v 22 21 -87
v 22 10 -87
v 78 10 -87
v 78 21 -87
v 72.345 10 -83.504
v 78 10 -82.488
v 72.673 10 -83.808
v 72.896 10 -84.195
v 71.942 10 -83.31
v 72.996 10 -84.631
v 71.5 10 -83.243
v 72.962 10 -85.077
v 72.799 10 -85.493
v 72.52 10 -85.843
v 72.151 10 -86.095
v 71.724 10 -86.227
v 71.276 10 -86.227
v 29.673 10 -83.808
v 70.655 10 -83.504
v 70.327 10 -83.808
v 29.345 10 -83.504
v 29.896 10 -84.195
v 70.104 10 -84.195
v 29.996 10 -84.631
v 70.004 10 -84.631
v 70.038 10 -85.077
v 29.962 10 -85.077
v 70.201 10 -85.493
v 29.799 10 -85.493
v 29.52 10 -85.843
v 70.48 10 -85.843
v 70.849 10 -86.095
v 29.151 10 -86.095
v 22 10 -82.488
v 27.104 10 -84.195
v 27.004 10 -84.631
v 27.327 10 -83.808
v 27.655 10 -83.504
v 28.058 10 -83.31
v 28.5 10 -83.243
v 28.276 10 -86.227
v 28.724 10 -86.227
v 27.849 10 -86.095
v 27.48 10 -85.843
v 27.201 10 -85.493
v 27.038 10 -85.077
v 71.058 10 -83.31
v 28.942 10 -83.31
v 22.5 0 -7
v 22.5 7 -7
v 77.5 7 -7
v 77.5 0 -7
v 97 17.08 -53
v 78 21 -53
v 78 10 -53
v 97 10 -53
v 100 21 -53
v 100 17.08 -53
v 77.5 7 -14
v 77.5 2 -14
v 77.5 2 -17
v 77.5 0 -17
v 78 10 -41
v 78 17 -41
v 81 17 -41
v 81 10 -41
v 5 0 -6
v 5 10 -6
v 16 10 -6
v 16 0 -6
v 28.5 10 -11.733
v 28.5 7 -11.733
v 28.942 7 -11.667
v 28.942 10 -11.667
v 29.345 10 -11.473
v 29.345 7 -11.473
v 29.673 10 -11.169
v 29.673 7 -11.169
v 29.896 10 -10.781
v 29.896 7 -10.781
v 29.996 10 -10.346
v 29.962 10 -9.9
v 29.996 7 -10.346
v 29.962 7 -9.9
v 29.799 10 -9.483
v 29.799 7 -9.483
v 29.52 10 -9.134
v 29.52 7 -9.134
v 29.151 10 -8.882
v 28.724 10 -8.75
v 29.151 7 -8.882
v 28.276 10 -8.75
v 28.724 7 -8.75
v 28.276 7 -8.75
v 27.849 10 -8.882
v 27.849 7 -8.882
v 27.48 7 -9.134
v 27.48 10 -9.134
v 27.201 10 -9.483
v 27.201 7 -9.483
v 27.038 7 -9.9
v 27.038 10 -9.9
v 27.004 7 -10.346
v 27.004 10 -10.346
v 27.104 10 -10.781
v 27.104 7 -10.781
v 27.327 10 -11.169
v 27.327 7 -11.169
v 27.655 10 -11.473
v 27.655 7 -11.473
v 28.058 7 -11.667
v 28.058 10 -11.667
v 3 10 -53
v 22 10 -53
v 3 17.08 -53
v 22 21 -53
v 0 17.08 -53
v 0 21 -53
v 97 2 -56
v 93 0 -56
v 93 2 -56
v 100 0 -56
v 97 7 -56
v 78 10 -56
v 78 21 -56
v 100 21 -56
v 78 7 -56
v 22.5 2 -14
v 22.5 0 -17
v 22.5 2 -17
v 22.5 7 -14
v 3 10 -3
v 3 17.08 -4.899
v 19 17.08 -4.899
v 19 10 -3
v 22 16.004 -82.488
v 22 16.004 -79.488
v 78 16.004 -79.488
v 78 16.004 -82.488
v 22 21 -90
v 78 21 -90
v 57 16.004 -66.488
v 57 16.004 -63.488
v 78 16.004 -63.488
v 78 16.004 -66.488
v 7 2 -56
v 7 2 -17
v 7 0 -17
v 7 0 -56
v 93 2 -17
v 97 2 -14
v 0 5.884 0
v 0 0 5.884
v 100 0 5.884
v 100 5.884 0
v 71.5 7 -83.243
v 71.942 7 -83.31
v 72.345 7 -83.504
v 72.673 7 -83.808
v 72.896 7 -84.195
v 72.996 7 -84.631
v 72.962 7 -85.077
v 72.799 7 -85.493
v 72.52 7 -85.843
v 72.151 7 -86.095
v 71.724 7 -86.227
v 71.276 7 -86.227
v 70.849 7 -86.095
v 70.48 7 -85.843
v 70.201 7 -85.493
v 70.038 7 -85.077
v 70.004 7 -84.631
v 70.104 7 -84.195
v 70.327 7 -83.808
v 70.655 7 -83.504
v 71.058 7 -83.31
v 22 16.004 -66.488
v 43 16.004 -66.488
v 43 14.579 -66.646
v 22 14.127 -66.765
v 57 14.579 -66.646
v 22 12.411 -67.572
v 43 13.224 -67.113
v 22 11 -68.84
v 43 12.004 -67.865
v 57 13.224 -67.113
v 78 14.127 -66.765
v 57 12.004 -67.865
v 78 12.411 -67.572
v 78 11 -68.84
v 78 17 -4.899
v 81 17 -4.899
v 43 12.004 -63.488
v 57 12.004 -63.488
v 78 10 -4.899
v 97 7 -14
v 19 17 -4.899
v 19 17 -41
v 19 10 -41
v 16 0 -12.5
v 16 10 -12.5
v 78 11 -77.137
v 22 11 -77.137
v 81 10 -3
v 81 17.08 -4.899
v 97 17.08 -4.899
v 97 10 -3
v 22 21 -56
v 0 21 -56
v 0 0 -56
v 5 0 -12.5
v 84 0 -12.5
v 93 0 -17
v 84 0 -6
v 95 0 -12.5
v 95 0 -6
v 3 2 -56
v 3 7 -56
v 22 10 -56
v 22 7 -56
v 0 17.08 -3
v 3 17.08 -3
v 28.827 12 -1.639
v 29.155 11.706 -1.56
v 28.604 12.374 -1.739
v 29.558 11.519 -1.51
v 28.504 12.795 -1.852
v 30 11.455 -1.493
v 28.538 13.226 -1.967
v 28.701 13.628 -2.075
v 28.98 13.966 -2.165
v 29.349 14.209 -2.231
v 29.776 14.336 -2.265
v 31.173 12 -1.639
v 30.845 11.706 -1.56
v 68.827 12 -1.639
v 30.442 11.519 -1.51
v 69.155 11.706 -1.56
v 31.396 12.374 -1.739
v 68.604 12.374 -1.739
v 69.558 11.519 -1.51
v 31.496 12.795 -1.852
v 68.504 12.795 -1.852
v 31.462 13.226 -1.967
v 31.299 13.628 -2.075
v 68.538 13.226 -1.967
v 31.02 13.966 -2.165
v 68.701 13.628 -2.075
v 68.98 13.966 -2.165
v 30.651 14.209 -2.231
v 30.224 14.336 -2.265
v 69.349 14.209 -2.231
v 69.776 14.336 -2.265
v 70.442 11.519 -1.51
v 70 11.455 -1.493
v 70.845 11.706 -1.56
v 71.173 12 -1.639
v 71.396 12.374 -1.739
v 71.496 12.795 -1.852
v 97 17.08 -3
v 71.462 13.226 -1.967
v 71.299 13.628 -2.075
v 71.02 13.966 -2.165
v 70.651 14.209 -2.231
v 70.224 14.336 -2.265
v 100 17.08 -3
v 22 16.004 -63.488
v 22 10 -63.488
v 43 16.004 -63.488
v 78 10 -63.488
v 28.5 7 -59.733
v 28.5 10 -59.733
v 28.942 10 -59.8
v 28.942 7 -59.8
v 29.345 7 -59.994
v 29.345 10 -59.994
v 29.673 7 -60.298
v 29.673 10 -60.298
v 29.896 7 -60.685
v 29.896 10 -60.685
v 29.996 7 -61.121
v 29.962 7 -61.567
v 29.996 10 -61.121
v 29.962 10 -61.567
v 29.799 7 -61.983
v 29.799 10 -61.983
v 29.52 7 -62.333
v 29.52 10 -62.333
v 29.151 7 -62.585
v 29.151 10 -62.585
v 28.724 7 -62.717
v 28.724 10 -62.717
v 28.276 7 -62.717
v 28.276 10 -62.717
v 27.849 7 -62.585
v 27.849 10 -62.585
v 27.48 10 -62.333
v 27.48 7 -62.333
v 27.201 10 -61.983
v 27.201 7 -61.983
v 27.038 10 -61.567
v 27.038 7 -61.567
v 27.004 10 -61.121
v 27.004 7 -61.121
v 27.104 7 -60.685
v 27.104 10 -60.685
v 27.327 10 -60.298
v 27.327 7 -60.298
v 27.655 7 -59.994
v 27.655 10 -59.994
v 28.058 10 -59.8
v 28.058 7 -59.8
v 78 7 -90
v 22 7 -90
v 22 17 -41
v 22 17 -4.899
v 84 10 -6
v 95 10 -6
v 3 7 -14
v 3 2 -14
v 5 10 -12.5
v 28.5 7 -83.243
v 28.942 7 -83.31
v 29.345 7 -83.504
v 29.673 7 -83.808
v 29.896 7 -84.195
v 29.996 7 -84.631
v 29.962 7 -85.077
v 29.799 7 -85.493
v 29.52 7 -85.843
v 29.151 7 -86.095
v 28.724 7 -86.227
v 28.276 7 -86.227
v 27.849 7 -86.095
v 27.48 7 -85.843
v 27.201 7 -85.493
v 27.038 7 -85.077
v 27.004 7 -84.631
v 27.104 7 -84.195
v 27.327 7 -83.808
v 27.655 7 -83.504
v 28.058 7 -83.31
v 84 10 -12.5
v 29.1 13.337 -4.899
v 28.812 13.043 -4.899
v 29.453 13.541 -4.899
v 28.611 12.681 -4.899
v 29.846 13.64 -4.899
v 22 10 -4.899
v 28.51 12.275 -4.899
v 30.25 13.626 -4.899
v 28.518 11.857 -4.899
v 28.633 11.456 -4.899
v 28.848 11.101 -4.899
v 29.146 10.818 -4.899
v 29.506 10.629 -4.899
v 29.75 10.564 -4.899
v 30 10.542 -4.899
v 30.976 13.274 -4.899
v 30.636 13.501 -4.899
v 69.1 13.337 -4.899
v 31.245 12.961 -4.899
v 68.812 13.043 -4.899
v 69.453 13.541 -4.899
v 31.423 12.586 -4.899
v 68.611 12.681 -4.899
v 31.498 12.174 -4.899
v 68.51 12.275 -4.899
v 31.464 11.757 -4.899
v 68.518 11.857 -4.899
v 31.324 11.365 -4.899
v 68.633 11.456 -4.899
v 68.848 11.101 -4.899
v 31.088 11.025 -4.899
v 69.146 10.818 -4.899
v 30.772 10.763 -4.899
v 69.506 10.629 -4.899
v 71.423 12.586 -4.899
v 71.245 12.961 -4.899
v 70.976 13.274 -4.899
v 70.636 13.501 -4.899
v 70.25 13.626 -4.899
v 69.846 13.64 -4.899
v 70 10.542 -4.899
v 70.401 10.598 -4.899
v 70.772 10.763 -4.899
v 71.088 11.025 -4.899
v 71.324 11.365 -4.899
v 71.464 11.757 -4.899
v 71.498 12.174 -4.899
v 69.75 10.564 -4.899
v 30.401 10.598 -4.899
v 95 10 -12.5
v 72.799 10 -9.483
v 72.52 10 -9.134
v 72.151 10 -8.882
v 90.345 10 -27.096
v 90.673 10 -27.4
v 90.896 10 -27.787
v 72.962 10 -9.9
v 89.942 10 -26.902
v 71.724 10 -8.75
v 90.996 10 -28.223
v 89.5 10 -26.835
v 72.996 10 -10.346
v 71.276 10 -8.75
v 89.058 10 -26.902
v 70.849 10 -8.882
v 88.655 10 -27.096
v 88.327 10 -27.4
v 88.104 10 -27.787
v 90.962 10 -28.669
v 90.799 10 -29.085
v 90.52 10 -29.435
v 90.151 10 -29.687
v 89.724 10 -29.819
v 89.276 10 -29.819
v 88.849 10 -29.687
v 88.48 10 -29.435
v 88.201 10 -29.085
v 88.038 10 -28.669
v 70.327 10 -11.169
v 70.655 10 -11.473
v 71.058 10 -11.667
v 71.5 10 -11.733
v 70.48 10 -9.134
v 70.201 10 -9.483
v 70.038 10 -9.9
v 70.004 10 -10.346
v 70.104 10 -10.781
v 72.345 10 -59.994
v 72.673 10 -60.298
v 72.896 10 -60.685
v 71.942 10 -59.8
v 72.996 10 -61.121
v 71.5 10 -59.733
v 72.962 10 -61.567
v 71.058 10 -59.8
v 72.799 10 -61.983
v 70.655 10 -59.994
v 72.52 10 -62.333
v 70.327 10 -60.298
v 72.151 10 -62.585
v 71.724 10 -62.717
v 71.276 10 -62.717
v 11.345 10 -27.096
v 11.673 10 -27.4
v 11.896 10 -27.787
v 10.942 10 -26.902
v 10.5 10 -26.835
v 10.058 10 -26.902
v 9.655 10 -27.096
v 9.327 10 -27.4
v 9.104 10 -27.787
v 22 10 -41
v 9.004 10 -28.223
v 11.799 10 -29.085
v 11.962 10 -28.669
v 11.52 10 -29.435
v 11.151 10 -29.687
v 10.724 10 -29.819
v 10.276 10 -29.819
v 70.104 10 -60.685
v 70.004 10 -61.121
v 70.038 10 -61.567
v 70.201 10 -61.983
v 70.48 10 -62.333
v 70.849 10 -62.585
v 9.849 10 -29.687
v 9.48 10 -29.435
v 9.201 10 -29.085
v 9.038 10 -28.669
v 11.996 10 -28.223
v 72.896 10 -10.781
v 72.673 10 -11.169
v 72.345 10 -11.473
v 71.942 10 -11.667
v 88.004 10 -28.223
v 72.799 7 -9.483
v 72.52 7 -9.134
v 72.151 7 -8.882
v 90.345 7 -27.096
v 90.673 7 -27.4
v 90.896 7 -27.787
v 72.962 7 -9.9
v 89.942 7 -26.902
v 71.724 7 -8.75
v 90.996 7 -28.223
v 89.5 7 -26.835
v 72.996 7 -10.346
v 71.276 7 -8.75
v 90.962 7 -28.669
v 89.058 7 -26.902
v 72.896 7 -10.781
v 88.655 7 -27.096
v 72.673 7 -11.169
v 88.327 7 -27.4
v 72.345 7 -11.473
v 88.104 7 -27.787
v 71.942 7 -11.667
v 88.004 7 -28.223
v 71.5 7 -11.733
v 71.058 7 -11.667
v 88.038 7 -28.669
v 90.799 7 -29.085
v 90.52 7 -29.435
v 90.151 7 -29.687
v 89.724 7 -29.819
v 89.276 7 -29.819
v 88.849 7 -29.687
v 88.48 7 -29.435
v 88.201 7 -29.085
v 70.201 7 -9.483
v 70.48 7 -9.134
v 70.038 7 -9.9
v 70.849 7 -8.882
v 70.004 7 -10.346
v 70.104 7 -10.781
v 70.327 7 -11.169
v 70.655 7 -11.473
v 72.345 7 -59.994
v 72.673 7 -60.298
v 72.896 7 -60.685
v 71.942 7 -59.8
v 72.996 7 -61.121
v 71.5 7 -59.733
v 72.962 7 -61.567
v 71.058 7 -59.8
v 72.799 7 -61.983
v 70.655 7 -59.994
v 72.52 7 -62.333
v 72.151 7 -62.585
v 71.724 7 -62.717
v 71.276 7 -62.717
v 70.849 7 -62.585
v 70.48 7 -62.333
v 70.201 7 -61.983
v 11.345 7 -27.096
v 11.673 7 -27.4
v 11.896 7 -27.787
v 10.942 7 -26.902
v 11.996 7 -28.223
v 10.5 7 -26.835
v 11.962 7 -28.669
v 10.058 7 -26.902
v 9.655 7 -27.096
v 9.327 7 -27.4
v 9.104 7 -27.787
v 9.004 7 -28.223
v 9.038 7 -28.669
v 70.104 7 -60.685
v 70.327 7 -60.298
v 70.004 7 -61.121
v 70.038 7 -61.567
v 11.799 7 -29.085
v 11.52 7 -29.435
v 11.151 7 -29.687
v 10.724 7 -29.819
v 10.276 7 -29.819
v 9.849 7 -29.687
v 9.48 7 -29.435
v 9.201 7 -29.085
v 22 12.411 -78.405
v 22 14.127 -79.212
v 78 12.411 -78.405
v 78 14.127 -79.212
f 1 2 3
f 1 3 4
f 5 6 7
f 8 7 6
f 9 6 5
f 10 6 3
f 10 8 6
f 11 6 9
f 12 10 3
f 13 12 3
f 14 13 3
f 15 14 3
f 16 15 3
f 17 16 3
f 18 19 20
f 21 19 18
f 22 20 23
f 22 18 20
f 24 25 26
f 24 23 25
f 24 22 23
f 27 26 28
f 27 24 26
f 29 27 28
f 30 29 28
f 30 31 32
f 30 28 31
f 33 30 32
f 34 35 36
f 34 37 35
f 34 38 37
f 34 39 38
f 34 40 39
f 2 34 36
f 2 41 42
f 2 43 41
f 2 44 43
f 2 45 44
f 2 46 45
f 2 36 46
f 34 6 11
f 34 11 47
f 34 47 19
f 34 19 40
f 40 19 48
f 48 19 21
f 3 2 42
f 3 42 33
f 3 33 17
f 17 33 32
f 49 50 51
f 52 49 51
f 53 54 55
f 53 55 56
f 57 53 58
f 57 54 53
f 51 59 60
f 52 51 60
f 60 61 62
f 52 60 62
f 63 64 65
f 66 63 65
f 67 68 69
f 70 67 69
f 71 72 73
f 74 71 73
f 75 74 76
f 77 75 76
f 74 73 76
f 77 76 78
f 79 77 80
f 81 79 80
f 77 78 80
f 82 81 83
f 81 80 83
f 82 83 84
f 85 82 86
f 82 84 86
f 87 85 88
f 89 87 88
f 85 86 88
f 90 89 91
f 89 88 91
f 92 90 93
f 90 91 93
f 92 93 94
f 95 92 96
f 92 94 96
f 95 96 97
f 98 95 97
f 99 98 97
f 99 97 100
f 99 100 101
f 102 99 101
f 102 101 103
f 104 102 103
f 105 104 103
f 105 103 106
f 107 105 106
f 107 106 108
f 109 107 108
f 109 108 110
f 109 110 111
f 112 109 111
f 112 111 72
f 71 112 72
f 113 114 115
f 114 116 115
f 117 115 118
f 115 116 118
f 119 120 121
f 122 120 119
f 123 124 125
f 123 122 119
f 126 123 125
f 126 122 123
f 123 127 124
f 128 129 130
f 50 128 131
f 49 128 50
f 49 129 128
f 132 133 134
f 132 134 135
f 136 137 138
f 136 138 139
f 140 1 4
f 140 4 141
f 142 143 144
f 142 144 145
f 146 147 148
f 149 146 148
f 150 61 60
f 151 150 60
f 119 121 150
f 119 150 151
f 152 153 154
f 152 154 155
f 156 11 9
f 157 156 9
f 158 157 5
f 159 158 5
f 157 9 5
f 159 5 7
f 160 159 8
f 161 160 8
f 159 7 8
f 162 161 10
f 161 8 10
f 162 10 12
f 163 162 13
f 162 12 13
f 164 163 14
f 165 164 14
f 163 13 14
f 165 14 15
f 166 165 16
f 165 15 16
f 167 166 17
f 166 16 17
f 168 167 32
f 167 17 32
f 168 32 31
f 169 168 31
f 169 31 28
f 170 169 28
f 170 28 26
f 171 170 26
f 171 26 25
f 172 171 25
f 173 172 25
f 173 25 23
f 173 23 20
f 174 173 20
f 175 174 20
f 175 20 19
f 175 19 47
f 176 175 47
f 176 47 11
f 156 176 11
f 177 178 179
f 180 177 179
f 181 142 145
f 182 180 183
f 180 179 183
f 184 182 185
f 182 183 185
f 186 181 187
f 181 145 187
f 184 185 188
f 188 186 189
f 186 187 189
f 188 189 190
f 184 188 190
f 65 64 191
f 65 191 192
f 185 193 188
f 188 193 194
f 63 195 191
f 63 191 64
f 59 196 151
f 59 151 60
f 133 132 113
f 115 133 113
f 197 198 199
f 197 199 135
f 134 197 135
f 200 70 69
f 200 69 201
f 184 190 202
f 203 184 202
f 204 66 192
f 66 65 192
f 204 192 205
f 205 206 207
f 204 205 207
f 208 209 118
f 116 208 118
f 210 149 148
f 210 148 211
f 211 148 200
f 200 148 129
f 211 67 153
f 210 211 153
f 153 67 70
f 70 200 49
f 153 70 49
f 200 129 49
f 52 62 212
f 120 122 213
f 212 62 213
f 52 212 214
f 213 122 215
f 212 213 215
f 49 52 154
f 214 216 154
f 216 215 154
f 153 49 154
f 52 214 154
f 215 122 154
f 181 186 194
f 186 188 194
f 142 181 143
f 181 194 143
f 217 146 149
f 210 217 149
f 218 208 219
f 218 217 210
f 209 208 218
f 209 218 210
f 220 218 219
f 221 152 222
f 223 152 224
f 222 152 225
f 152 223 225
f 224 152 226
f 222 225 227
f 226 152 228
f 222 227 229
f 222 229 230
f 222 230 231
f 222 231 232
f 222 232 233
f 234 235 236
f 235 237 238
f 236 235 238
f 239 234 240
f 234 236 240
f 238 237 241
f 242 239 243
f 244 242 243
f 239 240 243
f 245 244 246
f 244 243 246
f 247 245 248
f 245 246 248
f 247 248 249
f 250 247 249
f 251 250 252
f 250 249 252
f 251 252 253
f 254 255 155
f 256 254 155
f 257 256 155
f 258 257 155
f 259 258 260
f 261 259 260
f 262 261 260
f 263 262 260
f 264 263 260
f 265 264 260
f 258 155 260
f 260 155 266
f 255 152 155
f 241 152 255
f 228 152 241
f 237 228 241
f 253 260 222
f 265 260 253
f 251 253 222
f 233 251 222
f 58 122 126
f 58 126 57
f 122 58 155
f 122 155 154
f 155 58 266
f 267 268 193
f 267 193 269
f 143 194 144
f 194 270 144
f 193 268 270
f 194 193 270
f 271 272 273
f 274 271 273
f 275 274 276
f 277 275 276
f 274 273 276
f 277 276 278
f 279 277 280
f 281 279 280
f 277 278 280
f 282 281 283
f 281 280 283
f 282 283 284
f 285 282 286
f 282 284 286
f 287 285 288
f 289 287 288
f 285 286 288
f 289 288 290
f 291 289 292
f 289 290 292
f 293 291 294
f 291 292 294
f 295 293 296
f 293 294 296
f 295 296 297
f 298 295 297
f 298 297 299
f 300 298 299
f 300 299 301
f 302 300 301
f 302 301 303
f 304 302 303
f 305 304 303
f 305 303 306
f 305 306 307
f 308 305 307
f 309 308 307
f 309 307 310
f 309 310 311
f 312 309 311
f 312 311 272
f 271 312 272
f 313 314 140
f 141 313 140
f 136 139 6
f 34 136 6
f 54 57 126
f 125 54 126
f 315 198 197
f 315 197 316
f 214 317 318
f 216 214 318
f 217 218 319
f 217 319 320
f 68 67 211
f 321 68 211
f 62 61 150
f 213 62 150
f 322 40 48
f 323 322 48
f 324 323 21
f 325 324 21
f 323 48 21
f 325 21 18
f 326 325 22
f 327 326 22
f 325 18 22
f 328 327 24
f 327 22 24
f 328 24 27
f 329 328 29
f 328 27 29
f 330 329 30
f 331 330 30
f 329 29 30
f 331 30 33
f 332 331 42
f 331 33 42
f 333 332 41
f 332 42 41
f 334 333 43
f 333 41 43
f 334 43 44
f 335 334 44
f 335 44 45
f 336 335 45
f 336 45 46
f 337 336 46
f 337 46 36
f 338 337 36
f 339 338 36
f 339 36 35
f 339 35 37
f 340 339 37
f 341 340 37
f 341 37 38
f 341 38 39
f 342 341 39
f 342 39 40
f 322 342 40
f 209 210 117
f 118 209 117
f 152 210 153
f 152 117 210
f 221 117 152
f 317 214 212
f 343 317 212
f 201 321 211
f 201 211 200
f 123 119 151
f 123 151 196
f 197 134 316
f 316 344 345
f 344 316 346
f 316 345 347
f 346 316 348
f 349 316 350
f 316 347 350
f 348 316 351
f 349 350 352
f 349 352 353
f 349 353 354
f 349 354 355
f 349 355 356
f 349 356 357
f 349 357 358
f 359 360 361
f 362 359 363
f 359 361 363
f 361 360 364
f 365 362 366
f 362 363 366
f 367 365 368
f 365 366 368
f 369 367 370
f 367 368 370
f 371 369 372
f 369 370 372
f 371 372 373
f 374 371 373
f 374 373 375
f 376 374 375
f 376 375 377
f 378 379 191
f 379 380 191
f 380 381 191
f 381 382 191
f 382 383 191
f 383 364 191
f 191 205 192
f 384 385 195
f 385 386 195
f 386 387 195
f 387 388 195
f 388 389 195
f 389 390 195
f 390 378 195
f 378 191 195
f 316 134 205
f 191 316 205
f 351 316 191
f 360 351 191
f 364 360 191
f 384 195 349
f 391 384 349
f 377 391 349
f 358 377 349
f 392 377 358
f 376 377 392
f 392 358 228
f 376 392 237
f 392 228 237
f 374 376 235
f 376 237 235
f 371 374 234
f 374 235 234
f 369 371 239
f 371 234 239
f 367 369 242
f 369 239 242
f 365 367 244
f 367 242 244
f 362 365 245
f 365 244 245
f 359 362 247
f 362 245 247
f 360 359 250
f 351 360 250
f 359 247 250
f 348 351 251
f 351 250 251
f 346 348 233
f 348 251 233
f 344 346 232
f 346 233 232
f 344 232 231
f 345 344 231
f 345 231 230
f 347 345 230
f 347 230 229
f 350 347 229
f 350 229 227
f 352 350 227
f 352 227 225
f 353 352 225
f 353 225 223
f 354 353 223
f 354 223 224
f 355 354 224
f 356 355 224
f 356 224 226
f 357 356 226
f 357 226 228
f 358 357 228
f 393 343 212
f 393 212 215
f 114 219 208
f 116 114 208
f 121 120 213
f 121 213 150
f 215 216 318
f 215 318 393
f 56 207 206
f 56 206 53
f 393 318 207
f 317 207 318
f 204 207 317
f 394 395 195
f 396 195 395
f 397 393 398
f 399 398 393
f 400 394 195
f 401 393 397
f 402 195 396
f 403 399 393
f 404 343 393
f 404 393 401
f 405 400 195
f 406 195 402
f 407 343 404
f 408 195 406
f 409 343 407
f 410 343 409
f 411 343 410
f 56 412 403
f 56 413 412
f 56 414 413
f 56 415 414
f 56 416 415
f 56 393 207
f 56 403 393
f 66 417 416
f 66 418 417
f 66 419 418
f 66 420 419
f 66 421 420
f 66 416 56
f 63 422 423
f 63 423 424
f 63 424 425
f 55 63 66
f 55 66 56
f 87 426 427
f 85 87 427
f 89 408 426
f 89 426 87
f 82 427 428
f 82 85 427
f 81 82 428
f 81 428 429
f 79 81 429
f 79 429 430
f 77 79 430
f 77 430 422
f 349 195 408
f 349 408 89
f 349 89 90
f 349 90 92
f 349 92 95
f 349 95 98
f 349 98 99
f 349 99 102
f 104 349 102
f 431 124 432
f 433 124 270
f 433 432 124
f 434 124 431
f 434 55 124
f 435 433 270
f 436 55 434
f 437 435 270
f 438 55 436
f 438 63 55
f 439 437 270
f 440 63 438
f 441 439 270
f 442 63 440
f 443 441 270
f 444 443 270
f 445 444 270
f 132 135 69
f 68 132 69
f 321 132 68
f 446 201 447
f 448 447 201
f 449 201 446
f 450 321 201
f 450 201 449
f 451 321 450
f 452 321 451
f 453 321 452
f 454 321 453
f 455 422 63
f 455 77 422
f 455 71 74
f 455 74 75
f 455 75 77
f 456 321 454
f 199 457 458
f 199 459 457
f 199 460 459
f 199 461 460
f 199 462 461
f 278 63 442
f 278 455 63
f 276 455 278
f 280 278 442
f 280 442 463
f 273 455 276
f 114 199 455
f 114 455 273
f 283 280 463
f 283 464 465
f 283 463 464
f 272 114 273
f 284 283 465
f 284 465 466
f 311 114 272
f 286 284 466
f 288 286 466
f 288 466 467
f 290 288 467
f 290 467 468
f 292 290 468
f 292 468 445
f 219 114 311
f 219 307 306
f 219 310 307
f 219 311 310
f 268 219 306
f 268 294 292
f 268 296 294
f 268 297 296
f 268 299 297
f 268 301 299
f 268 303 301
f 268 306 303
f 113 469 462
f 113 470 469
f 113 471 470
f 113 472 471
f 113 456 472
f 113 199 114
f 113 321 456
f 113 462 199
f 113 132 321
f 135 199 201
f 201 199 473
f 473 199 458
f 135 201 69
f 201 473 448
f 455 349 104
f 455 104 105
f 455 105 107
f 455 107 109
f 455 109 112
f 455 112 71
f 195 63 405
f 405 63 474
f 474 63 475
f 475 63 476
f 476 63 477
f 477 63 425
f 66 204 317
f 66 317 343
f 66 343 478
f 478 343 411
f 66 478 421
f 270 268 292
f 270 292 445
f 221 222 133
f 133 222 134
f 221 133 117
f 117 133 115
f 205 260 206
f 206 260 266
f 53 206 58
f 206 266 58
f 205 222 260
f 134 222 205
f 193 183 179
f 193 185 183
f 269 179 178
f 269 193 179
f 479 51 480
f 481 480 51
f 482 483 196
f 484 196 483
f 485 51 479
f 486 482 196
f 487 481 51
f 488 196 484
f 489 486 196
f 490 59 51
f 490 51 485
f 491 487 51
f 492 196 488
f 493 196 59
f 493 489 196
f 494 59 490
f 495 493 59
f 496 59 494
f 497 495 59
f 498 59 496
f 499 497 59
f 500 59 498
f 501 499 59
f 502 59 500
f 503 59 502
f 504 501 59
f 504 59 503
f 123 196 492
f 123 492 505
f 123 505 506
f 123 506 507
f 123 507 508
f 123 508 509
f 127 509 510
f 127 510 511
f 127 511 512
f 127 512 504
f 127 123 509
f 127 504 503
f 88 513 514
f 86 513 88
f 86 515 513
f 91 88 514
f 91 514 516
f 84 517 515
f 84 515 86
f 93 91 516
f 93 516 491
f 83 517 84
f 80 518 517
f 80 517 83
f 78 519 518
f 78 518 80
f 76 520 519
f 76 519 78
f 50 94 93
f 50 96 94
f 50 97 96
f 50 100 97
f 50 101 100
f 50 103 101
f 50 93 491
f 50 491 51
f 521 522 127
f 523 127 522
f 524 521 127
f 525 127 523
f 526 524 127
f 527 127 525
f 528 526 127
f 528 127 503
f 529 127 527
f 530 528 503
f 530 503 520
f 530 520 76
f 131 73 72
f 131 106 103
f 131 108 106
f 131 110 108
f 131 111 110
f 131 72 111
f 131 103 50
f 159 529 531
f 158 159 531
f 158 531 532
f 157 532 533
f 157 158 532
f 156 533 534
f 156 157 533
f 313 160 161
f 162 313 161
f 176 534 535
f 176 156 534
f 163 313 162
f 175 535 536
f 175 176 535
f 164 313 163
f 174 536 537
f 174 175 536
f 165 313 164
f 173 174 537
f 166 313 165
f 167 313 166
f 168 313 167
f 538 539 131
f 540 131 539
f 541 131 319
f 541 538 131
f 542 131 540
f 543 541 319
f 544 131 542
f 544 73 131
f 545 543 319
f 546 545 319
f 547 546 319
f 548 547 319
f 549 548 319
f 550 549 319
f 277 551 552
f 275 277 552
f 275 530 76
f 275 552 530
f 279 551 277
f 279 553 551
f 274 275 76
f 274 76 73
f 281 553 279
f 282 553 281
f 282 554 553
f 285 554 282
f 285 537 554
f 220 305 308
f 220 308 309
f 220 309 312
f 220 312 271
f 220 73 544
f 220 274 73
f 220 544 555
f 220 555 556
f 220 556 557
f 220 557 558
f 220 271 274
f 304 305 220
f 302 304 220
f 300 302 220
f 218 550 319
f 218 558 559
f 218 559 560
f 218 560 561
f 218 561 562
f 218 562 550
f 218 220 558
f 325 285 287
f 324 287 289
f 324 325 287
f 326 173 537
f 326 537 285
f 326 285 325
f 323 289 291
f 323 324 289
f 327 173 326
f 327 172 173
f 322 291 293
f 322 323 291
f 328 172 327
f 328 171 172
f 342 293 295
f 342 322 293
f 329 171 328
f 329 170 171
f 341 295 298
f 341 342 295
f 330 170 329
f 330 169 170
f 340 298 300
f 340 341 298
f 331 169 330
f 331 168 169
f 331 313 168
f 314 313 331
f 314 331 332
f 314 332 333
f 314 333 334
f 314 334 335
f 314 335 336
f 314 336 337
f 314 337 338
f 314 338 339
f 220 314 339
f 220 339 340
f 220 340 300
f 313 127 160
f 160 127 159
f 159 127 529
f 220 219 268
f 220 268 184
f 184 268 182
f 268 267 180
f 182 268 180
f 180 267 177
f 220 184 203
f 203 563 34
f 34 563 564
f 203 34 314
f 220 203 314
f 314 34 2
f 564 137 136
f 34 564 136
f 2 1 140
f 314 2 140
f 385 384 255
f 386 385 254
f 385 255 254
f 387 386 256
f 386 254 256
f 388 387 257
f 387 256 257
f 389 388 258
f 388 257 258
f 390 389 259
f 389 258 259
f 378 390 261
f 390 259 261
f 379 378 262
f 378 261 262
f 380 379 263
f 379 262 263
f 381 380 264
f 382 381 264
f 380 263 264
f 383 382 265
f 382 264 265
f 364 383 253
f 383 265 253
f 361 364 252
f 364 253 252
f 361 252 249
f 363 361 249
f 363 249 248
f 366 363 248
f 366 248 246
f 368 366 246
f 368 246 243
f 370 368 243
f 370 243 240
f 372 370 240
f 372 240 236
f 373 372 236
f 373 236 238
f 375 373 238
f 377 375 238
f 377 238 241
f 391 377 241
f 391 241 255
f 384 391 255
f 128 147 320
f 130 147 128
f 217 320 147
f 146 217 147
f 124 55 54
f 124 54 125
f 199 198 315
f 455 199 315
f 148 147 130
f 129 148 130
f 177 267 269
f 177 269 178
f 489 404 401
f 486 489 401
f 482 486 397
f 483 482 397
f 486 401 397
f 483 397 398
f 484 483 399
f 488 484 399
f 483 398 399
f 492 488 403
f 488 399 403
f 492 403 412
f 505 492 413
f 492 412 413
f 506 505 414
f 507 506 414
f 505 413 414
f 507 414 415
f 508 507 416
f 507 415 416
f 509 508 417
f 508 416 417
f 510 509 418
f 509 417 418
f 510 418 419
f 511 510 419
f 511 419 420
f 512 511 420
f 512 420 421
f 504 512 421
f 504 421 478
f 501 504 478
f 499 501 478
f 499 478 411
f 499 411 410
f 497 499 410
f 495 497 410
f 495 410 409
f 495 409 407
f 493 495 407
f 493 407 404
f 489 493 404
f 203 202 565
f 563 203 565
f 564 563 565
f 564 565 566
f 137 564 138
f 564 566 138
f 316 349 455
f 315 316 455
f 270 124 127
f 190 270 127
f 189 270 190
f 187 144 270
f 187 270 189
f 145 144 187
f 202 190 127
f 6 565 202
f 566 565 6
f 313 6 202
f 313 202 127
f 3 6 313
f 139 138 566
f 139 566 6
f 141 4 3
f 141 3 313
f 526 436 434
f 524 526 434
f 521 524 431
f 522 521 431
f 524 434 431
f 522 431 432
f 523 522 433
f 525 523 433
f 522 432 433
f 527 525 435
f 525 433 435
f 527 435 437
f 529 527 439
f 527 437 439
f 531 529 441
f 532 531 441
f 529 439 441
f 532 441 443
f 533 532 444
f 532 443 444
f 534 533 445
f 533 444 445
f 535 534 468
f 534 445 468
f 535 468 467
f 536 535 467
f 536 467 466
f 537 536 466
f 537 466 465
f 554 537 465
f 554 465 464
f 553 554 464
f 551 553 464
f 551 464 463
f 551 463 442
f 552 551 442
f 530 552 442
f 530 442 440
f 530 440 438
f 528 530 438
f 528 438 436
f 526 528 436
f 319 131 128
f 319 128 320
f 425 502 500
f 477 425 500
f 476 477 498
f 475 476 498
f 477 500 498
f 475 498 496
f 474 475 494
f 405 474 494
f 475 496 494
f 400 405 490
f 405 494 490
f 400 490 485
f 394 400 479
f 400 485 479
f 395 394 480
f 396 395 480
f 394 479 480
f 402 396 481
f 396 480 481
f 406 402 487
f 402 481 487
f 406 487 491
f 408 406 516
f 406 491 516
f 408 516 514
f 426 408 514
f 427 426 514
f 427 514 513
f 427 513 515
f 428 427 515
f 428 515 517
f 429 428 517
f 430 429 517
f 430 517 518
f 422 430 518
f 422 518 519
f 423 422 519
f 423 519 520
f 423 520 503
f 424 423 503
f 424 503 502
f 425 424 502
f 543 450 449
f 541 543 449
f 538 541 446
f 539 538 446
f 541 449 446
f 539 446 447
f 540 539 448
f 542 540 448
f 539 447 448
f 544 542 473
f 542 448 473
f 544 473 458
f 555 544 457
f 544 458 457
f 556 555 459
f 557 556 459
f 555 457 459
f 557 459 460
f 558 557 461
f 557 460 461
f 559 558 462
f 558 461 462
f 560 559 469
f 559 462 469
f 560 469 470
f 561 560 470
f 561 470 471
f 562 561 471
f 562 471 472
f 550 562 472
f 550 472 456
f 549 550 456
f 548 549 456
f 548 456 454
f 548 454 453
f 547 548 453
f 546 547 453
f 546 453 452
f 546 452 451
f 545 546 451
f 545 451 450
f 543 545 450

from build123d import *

# Parameters (mm, degrees)
ESBO_O1_W                 = 90
ESBO_O1_H                 = 10
RESSALTO_EXTRUS_O1_DEPTH  = 100
CORTE_EXTRUS_O1_DEPTH     = 73
ESBO_O5_W                 = 11
ESBO_O5_H                 = 6.5
CORTE_EXTRUS_O2_DEPTH     = 135.907375632
ESBO_O8_W                 = 94
ESBO_O8_H                 = 5
CORTE_EXTRUS_O3_DEPTH     = 3
ESBO_O9_W                 = 94
ESBO_O9_H                 = 84
RESSALTO_EXTRUS_O2_DEPTH  = 8
ESBO_O10_W                = 34
ESBO_O10_H                = 18
CORTE_EXTRUS_O4_DEPTH     = 22
ESBO_O11_W                = 34
ESBO_O11_H                = 18
CORTE_EXTRUS_O5_DEPTH     = 22
CORTE_EXTRUS_O8_DEPTH     = 100
ESBO_O19_W                = 53
ESBO_O19_H                = 0.919551387
CORTE_EXTRUS_O10_DEPTH    = 136.735036008
RESSALTO_EXTRUS_O4_DEPTH  = 56
ESBO_O21_W                = 3
ESBO_O21_H                = 3
RESSALTO_EXTRUS_O5_DEPTH  = 56
RESSALTO_EXTRUS_O6_DEPTH  = 100
ESBO_O25_R                = 1.5
CORTE_EXTRUS_O11_DEPTH    = 135.985184372
ESBO_O26_R                = 1.5
CORTE_EXTRUS_O14_DEPTH    = 135.985184372
ESBO_O28_W                = 3
ESBO_O28_H                = 51.10099753
RESSALTO_EXTRUS_O7_DEPTH  = 7
RESSALTO_EXTRUS_O8_DEPTH  = 62
ESBO_O30_W                = 16
ESBO_O30_H                = 3
RESSALTO_EXTRUS_O9_DEPTH  = 7
ESBO_O31_W                = 62
ESBO_O31_H                = 12
CORTE_EXTRUS_O15_DEPTH    = 7
ESBO_O33_W                = 3
ESBO_O33_H                = 3.919551387
RESSALTO_EXTRUS_O11_DEPTH = 22
ESBO_O34_W                = 3
ESBO_O34_H                = 3.919551387
RESSALTO_EXTRUS_O12_DEPTH = 22
ESBO_O35_W                = 19
ESBO_O35_H                = 0.080448613
RESSALTO_EXTRUS_O13_DEPTH = 3
ESBO_O36_R                = 1.5
CORTE_EXTRUS_O16_DEPTH    = 135.985184372
ESBO_O37_W                = 14
ESBO_O37_H                = 4
CORTE_EXTRUS_O17_DEPTH    = 6
RESSALTO_EXTRUS_O14_DEPTH = 100
ESBO_O39_R                = 1.5
ESBO_O39_R_2              = 1.500009338
CORTE_EXTRUS_O18_DEPTH    = 4
ESBO_O40_R                = 1.5
CORTE_EXTRUS_O19_DEPTH    = 10
CORTE_EXTRUS_O21_DEPTH    = 7
ESBO_O43_W                = 55
ESBO_O43_H                = 14.196322654
CORTE_EXTRUS_O23_DEPTH    = 2


with BuildPart() as part:
    # Esboço1 → Ressalto-extrusão1 (new body)
    with BuildSketch(Plane(origin=(0, 0, 0), x_dir=(0, 0, -1), z_dir=(1, 0, 0))):
        with Locations((45, 5)):
            Rectangle(ESBO_O1_W, ESBO_O1_H)
    extrude(amount=RESSALTO_EXTRUS_O1_DEPTH)

    # Esboço3 → Corte-extrusão1 (cut)
    with BuildSketch(Plane(origin=(0, 0, -90), x_dir=(-1, 0, 0), z_dir=(0, 0, -1))):
        Polygon((-93, 0), (-93, 2), (-97, 2), (-97, 7), (-3, 7), (-3, 2), (-7, 2), (-7, 0), align=None)
    extrude(amount=-CORTE_EXTRUS_O1_DEPTH, mode=Mode.SUBTRACT)

    # Esboço5 → Corte-extrusão2 (cut, through all)
    with BuildSketch(Plane(origin=(0, 10, 0), x_dir=(1, 0, 0), z_dir=(0, 1, 0))):
        with Locations((10.5, 9.25)):
            Rectangle(ESBO_O5_W, ESBO_O5_H)
        with Locations((89.5, 9.25)):
            Rectangle(ESBO_O5_W, ESBO_O5_H)
    extrude(amount=-CORTE_EXTRUS_O2_DEPTH, mode=Mode.SUBTRACT)

    # Esboço8 → Corte-extrusão3 (cut)
    with BuildSketch(Plane(origin=(0, 0, -17), x_dir=(-1, 0, 0), z_dir=(0, 0, -1))):
        with Locations((-50, 4.5)):
            Rectangle(ESBO_O8_W, ESBO_O8_H)
    extrude(amount=-CORTE_EXTRUS_O3_DEPTH, mode=Mode.SUBTRACT)

    # Esboço9 → Ressalto-extrusão2 (add)
    with BuildSketch(Plane(origin=(0, 10, 0), x_dir=(1, 0, 0), z_dir=(0, 1, 0))):
        Polygon((0, 1.678302474), (0, 0), (2, 0), (100, 0), (100, 1.678302474), (100, 90), (97, 90), (3, 90), (0, 90), align=None)
        with Locations((50, 45)):
            Rectangle(ESBO_O9_W, ESBO_O9_H, mode=Mode.SUBTRACT)
    extrude(amount=RESSALTO_EXTRUS_O2_DEPTH)

    # Esboço10 → Corte-extrusão4 (cut)
    with BuildSketch(Plane.ZY):
        with Locations((-73, 9)):
            Rectangle(ESBO_O10_W, ESBO_O10_H)
    extrude(amount=-CORTE_EXTRUS_O4_DEPTH, mode=Mode.SUBTRACT)

    # Esboço11 → Corte-extrusão5 (cut)
    with BuildSketch(Plane(origin=(100, 0, 0), x_dir=(0, 0, -1), z_dir=(1, 0, 0))):
        with Locations((73, 9)):
            Rectangle(ESBO_O11_W, ESBO_O11_H)
    extrude(amount=-CORTE_EXTRUS_O5_DEPTH, mode=Mode.SUBTRACT)

    # Esboço15 → Corte-extrusão8 (cut)
    with BuildSketch(Plane(origin=(100, 0, 0), x_dir=(0, 0, -1), z_dir=(1, 0, 0))):
        Polygon((0, 5.88429619), (3.246393052, 18), (0, 18), align=None)
    extrude(amount=-CORTE_EXTRUS_O8_DEPTH, mode=Mode.SUBTRACT)

    # Esboço19 → Corte-extrusão10 (cut, through all)
    with BuildSketch(Plane(origin=(100, 0, 0), x_dir=(0, 0, -1), z_dir=(1, 0, 0))):
        with Locations((29.5, 17.540224307)):
            Rectangle(ESBO_O19_W, ESBO_O19_H)
    extrude(amount=-CORTE_EXTRUS_O10_DEPTH, mode=Mode.SUBTRACT)

    # Esboço20 → Ressalto-extrusão4 (add)
    with BuildSketch(Plane(origin=(78, 0, 0), x_dir=(0, 0, -1), z_dir=(1, 0, 0))):
        with BuildLine():
            Line((68.839605241, 11), (77.137237802, 11))
            ThreePointArc((77.137237802, 11), (78.871318989, 13.239422392), (79.48840166, 16.003705155))
            Line((79.48840166, 16.003705155), (82.48840166, 16.003705155))
            Line((82.48840166, 16.003705155), (82.48840166, 14))
            Line((82.48840166, 14), (82.48840166, 13))
            Line((82.48840166, 13), (82.48840166, 10))
            Line((82.48840166, 10), (81.830476132, 10))
            Line((81.830476132, 10), (63.488441382, 10))
            Line((63.488441382, 10), (63.488441382, 14))
            Line((63.488441382, 14), (63.488441382, 16.003705155))
            Line((63.488441382, 16.003705155), (66.488441382, 16.003705155))
            ThreePointArc((66.488441382, 16.003705155), (67.105524053, 13.239422392), (68.839605241, 11))
        make_face()
    extrude(amount=-RESSALTO_EXTRUS_O4_DEPTH)

    # Esboço21 → Ressalto-extrusão5 (add)
    with BuildSketch(Plane(origin=(78, 0, 0), x_dir=(0, 0, -1), z_dir=(1, 0, 0))):
        with Locations((88.5, 19.5)):
            Rectangle(ESBO_O21_W, ESBO_O21_H)
    extrude(amount=-RESSALTO_EXTRUS_O5_DEPTH)

    # Esboço22 → Ressalto-extrusão6 (add)
    with BuildSketch(Plane(origin=(100, 0, 0), x_dir=(0, 0, -1), z_dir=(1, 0, 0))):
        Polygon((4.89900247, 17.080448613), (3, 10), (3, 17.080448613), align=None)
    extrude(amount=-RESSALTO_EXTRUS_O6_DEPTH)

    # Esboço25 → Corte-extrusão11 (cut, through all)
    with BuildSketch(Plane(origin=(0, 10, 0), x_dir=(1, 0, 0), z_dir=(0, 1, 0))):
        with Locations(Location((10.5, 28.335399636, 0), (0, 0, 270))):
            Circle(ESBO_O25_R)
    extrude(amount=-CORTE_EXTRUS_O11_DEPTH, mode=Mode.SUBTRACT)

    # Esboço26 → Corte-extrusão14 (cut, through all)
    with BuildSketch(Plane(origin=(0, 10, 0), x_dir=(1, 0, 0), z_dir=(0, 1, 0))):
        with Locations(Location((89.5, 28.335399636, 0), (0, 0, 270))):
            Circle(ESBO_O26_R)
    extrude(amount=-CORTE_EXTRUS_O14_DEPTH, mode=Mode.SUBTRACT)

    # Esboço28 → Ressalto-extrusão7 (add)
    with BuildSketch(Plane(origin=(0, 10, 0), x_dir=(1, 0, 0), z_dir=(0, 1, 0))):
        with Locations((20.5, 30.449501235)):
            Rectangle(ESBO_O28_W, ESBO_O28_H)
        with Locations((79.5, 30.449501235)):
            Rectangle(ESBO_O28_W, ESBO_O28_H)
    extrude(amount=RESSALTO_EXTRUS_O7_DEPTH)

    # Esboço29 → Ressalto-extrusão8 (add)
    with BuildSketch(Plane(origin=(81, 0, 0), x_dir=(0, 0, -1), z_dir=(1, 0, 0))):
        Polygon((4.89900247, 10), (3, 10), (4.89900247, 17.080448613), align=None)
    extrude(amount=-RESSALTO_EXTRUS_O8_DEPTH)

    # Esboço30 → Ressalto-extrusão9 (add)
    with BuildSketch(Plane(origin=(0, 17, 0), x_dir=(1, 0, 0), z_dir=(0, 1, 0))):
        with Locations((11, 54.5)):
            Rectangle(ESBO_O30_W, ESBO_O30_H)
        with Locations((89, 54.5)):
            Rectangle(ESBO_O30_W, ESBO_O30_H)
    extrude(amount=-RESSALTO_EXTRUS_O9_DEPTH)

    # Esboço31 → Corte-extrusão15 (cut)
    with BuildSketch(Plane(origin=(0, 17, 0), x_dir=(1, 0, 0), z_dir=(0, 1, 0))):
        with Locations((50, 47)):
            Rectangle(ESBO_O31_W, ESBO_O31_H)
    extrude(amount=-CORTE_EXTRUS_O15_DEPTH, mode=Mode.SUBTRACT)

    # Esboço33 → Ressalto-extrusão11 (add)
    with BuildSketch(Plane(origin=(100, 0, 0), x_dir=(0, 0, -1), z_dir=(1, 0, 0))):
        with Locations((54.5, 19.040224307)):
            Rectangle(ESBO_O33_W, ESBO_O33_H)
    extrude(amount=-RESSALTO_EXTRUS_O11_DEPTH)

    # Esboço34 → Ressalto-extrusão12 (add)
    with BuildSketch(Plane.ZY):
        with Locations((-54.5, 19.040224307)):
            Rectangle(ESBO_O34_W, ESBO_O34_H)
    extrude(amount=-RESSALTO_EXTRUS_O12_DEPTH)

    # Esboço35 → Ressalto-extrusão13 (add)
    with BuildSketch(Plane(origin=(0, 0, -56), x_dir=(-1, 0, 0), z_dir=(0, 0, -1))):
        with Locations((-12.5, 17.040224307)):
            Rectangle(ESBO_O35_W, ESBO_O35_H)
        with Locations((-87.5, 17.040224307)):
            Rectangle(ESBO_O35_W, ESBO_O35_H)
    extrude(amount=-RESSALTO_EXTRUS_O13_DEPTH)

    # Esboço36 → Corte-extrusão16 (cut, through all)
    with BuildSketch(Plane(origin=(0, 10, 0), x_dir=(1, 0, 0), z_dir=(0, 1, 0))):
        with Locations(Location((71.5, 61.233441382, 0), (0, 0, 270))):
            Circle(ESBO_O36_R)
        with Locations(Location((28.5, 61.233441382, 0), (0, 0, 270))):
            Circle(ESBO_O36_R)
        with Locations(Location((71.5, 84.74340166, 0), (0, 0, 270))):
            Circle(ESBO_O36_R)
        with Locations(Location((28.5, 84.74340166, 0), (0, 0, 270))):
            Circle(ESBO_O36_R)
    extrude(amount=-CORTE_EXTRUS_O16_DEPTH, mode=Mode.SUBTRACT)

    # Esboço37 → Corte-extrusão17 (cut)
    with BuildSketch(Plane.XY.offset(-63.488441382)):
        with Locations((50, 14.003705155)):
            Rectangle(ESBO_O37_W, ESBO_O37_H)
    extrude(amount=-CORTE_EXTRUS_O17_DEPTH, mode=Mode.SUBTRACT)

    # Esboço38 → Ressalto-extrusão14 (add, through all)
    with BuildSketch(Plane(origin=(100, 0, 0), x_dir=(0, 0, -1), z_dir=(1, 0, 0))):
        Polygon((0, 0), (-5.88429619, 0), (0, 5.88429619), align=None)
    extrude(amount=-RESSALTO_EXTRUS_O14_DEPTH)

    # Esboço39 → Corte-extrusão18 (cut)
    with BuildSketch(Plane(origin=(0, 0.394173103, 1.471074047), x_dir=(1, 0, 0), z_dir=(0, 0.258819045102519, 0.9659258262890689))):
        with Locations(Location((30, 12.950688916, 0), (0, 0, 270))):
            Circle(ESBO_O39_R)
        with Locations(Location((70, 12.950688916, 0), (0, 0, 270))):
            Circle(ESBO_O39_R_2)
    extrude(amount=-CORTE_EXTRUS_O18_DEPTH, mode=Mode.SUBTRACT)

    # Esboço40 → Corte-extrusão19 (cut)
    with BuildSketch(Plane.XZ):
        with Locations(Location((28.5, -10.233441382, 0), (0, 0, 270))):
            Circle(ESBO_O40_R)
        with Locations(Location((71.5, -10.233441382, 0), (0, 0, 270))):
            Circle(ESBO_O40_R)
    extrude(amount=-CORTE_EXTRUS_O19_DEPTH, mode=Mode.SUBTRACT)

    # Esboço42 → Corte-extrusão21 (cut)
    with BuildSketch(Plane(origin=(0, 0, -14), x_dir=(-1, 0, 0), z_dir=(0, 0, -1))):
        Polygon((-77.5, 7), (-22.5, 7), (-22.5, 2), (-22.5, 0), (-77.5, 0), (-77.5, 2), align=None)
    extrude(amount=-CORTE_EXTRUS_O21_DEPTH, mode=Mode.SUBTRACT)

    # Esboço43 → Corte-extrusão23 (cut)
    with BuildSketch(Plane.XZ):
        with Locations((50, -14.098161327)):
            Rectangle(ESBO_O43_W, ESBO_O43_H)
    extrude(amount=-CORTE_EXTRUS_O23_DEPTH, mode=Mode.SUBTRACT)


solid = part.part
